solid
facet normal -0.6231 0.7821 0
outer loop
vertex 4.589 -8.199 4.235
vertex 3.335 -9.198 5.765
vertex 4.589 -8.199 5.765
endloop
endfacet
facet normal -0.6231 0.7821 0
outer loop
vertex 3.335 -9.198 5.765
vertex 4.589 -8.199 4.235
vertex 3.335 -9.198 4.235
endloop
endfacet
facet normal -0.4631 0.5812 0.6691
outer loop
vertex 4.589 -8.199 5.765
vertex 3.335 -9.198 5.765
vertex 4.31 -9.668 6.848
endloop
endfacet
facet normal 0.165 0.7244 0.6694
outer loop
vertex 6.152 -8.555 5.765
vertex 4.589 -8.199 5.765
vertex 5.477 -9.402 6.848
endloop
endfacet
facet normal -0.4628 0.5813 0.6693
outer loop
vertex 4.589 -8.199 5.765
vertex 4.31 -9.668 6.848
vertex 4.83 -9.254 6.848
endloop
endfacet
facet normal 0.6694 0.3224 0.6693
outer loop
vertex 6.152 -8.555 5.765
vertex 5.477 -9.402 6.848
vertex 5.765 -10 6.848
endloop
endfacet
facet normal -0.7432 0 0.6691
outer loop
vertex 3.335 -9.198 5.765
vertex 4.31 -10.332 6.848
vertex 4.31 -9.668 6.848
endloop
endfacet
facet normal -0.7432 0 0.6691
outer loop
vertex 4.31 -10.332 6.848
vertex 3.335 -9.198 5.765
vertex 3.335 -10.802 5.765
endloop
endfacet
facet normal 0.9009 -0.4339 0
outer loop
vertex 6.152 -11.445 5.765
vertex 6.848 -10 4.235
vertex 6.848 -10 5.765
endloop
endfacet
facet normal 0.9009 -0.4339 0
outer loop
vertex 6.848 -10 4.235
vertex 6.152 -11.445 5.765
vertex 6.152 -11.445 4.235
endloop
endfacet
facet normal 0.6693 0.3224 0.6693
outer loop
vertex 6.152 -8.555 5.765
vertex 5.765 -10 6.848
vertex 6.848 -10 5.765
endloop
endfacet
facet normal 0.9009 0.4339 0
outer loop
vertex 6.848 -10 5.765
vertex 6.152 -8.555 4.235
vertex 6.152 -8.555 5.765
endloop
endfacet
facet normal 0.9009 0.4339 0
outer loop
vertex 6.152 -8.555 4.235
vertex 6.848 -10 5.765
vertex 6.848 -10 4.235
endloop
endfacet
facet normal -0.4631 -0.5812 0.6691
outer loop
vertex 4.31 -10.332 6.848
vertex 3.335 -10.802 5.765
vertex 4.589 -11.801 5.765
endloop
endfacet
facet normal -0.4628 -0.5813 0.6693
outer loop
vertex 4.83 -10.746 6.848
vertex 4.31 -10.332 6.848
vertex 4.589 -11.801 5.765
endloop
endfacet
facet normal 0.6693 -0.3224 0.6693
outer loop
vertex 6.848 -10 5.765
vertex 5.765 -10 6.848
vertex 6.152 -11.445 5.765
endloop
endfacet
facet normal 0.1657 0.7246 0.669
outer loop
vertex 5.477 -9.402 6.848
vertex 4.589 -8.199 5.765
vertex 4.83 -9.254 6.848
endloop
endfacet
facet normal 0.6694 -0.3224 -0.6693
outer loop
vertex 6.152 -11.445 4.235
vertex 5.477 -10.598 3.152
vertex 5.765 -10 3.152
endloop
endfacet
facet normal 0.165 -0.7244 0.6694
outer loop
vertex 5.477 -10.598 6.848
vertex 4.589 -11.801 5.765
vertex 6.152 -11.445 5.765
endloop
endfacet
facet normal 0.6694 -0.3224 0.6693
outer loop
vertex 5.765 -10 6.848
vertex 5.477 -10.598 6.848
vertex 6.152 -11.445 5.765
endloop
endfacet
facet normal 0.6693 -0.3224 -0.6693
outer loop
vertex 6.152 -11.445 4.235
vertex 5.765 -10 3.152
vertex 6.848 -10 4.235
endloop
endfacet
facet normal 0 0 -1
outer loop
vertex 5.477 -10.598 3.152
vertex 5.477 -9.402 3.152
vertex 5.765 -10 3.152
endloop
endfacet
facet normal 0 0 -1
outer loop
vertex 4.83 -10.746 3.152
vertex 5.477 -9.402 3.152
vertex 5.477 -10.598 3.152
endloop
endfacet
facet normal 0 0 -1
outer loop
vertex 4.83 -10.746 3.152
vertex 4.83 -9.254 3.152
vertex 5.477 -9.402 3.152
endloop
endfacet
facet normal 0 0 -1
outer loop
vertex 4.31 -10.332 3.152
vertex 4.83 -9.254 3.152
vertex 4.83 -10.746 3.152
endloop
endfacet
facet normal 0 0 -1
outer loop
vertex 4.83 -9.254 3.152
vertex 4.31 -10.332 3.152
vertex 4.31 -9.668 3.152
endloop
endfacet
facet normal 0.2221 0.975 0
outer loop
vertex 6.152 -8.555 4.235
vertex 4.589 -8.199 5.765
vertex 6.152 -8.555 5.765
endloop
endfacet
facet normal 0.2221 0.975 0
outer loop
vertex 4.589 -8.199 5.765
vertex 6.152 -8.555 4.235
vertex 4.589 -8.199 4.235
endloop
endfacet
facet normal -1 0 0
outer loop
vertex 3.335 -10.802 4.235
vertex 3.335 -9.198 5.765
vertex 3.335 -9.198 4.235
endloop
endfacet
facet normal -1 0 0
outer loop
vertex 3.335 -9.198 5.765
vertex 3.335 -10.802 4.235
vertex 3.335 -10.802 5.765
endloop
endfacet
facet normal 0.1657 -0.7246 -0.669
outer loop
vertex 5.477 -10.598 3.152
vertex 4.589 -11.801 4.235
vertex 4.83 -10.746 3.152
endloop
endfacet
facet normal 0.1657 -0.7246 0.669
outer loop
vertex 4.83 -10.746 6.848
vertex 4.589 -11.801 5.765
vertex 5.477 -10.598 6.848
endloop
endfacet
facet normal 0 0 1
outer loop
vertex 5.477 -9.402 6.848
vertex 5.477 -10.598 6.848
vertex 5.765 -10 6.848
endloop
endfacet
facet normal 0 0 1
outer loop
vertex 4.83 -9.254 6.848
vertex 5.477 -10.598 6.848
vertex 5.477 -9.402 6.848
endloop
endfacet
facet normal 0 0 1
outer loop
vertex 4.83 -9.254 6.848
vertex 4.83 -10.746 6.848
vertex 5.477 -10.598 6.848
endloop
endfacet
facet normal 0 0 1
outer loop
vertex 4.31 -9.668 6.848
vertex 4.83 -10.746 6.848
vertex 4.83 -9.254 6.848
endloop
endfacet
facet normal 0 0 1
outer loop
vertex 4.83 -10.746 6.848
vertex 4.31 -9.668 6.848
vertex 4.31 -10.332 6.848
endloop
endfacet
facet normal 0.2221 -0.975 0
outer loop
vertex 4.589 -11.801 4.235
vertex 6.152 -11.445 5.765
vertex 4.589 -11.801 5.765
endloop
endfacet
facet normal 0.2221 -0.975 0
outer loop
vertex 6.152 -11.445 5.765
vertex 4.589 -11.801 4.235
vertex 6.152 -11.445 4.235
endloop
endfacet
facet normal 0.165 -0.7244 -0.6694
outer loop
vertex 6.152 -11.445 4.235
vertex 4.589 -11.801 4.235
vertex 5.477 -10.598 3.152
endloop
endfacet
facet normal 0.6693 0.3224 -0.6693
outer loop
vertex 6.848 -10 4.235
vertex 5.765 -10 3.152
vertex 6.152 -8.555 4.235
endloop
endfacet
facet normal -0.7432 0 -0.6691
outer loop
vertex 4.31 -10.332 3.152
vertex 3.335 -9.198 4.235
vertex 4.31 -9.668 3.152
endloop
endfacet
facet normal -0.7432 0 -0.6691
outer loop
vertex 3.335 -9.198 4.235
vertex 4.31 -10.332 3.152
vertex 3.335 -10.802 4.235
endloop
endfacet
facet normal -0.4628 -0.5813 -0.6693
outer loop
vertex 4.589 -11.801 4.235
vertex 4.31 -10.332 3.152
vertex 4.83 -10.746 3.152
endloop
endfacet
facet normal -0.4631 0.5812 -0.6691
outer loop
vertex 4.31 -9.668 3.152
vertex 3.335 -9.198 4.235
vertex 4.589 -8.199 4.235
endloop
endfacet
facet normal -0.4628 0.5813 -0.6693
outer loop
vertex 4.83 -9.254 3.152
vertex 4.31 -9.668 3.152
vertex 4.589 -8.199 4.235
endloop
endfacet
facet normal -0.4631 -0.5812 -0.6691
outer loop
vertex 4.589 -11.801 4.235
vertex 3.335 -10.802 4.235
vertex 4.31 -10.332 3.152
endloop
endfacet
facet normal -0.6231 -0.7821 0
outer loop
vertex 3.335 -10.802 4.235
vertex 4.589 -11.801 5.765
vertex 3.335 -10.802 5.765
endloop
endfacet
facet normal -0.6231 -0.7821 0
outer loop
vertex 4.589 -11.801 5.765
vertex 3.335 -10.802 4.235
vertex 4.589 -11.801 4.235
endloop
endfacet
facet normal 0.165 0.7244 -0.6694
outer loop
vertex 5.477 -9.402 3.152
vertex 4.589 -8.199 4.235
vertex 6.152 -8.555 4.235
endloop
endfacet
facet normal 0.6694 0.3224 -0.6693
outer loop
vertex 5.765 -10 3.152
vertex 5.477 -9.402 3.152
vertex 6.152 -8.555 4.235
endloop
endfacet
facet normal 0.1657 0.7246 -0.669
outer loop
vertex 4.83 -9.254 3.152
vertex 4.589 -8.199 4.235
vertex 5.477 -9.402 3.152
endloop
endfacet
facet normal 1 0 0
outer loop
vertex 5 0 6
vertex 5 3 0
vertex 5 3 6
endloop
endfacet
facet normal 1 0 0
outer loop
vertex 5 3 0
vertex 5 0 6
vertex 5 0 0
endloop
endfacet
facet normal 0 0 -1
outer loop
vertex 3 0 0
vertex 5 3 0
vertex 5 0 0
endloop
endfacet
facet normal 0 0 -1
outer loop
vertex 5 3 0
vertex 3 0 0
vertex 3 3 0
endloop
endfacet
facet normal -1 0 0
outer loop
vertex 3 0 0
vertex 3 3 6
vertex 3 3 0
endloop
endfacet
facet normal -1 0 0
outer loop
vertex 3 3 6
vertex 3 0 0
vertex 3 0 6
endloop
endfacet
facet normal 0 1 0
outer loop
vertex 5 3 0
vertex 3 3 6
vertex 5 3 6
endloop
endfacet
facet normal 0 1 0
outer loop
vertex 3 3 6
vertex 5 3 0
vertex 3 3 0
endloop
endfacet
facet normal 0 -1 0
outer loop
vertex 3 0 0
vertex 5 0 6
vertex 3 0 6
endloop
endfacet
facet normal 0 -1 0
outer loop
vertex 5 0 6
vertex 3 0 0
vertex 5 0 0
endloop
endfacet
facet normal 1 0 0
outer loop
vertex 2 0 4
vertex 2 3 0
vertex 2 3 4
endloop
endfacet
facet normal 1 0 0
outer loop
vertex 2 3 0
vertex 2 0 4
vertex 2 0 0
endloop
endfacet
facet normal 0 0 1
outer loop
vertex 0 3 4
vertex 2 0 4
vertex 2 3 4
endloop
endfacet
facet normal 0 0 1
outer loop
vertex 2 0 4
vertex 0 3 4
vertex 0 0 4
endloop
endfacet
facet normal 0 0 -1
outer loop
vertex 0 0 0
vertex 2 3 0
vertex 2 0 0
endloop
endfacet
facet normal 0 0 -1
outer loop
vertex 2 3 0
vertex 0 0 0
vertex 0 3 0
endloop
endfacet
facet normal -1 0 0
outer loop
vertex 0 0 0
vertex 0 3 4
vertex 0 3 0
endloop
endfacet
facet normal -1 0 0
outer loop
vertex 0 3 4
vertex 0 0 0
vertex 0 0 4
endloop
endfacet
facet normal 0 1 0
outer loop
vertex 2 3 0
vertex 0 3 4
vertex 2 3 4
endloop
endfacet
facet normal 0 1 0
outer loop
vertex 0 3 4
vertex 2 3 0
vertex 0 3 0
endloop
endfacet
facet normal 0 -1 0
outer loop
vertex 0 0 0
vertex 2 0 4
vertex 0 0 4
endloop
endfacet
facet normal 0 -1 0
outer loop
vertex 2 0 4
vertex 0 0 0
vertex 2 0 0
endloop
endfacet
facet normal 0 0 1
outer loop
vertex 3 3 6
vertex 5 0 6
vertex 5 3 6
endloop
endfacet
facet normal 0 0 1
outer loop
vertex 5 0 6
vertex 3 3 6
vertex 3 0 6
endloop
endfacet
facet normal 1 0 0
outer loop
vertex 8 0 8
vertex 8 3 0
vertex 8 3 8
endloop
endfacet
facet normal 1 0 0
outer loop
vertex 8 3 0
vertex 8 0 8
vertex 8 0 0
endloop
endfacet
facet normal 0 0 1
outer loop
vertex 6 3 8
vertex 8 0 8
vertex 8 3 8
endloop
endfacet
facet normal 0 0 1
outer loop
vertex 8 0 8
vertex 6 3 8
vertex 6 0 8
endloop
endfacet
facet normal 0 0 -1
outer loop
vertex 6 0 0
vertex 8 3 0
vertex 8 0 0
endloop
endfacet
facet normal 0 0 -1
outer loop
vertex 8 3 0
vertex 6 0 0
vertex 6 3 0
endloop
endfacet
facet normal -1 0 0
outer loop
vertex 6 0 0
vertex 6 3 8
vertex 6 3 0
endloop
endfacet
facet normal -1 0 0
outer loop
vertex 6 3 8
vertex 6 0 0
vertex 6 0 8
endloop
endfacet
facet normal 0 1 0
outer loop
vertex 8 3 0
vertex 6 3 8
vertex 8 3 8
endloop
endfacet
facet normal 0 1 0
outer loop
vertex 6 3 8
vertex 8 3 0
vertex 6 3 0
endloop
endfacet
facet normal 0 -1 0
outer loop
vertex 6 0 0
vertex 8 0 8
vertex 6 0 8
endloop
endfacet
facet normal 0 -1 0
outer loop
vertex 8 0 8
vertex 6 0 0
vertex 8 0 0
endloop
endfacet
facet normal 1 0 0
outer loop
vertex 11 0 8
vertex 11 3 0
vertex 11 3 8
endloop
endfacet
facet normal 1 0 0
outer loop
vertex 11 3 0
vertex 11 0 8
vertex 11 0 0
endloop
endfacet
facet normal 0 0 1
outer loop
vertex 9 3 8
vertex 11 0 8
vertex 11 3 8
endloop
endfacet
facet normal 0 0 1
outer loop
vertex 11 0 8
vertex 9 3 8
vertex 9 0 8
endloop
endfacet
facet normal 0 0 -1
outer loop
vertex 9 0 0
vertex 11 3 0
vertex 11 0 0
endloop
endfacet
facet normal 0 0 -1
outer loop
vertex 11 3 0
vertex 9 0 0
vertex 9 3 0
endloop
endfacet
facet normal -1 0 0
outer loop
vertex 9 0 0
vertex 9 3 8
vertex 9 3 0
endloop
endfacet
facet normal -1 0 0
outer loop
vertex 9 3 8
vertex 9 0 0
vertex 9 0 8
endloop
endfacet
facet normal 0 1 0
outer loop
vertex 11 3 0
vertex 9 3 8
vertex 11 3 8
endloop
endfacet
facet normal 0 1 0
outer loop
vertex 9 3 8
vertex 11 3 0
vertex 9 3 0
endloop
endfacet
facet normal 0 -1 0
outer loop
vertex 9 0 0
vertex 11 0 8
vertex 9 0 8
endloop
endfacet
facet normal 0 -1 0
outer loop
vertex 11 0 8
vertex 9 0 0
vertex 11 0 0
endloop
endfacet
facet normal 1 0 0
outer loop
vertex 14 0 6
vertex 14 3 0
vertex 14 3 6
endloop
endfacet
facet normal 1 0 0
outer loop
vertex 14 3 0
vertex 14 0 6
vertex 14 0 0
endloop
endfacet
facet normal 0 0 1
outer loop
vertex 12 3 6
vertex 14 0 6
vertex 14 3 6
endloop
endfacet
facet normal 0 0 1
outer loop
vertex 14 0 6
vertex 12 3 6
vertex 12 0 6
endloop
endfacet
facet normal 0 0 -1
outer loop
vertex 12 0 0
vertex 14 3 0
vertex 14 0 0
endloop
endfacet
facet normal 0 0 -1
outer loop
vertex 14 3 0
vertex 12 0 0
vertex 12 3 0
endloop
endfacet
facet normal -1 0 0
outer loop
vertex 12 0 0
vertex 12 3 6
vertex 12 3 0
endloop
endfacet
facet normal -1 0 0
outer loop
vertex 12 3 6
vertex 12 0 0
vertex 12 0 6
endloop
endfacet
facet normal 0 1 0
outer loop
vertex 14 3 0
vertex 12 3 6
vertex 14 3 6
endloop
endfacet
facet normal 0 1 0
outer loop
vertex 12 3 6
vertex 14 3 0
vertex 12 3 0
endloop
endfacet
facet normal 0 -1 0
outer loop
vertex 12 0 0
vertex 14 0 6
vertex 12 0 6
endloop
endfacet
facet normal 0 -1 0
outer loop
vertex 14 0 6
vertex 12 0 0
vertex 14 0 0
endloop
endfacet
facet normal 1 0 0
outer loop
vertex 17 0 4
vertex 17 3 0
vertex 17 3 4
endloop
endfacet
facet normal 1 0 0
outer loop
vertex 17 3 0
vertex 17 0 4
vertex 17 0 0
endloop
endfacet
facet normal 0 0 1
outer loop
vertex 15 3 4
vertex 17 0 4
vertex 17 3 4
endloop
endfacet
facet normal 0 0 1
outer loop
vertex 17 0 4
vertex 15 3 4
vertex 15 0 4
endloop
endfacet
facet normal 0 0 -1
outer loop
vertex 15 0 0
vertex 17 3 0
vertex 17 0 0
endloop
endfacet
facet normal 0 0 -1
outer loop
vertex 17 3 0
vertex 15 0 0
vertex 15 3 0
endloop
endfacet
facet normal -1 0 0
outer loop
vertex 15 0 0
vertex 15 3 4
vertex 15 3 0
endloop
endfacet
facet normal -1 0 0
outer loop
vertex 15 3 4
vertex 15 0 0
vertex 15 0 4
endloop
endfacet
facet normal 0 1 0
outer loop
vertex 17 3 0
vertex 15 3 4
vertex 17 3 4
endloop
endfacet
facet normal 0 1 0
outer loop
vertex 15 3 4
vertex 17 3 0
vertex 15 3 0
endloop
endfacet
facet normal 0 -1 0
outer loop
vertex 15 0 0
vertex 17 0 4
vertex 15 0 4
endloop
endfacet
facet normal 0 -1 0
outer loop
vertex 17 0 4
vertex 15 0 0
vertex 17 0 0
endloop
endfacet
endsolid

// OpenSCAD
//cube(100,50,25);
//sphere(50);
translate([5,-10,5]){sphere(2);}


//cube([2,3,4]);
translate([3,0,0]) {
  cube([2,3,4]);
}

color([1,1,0]) cube([2,3,4]);
translate([3,0,0])
color([0,1,1]) cube([2,3,6]);
translate([6,0,0])
color([1,0,1]) cube([2,3,8]);
//
translate([9,0,0])
color([1,1,0]) cube([2,3,8]);
translate([12,0,0])
color([0,1,0]) cube([2,3,6]);
translate([15,0,0])
color([1,0,0]) cube([2,3,4]);
